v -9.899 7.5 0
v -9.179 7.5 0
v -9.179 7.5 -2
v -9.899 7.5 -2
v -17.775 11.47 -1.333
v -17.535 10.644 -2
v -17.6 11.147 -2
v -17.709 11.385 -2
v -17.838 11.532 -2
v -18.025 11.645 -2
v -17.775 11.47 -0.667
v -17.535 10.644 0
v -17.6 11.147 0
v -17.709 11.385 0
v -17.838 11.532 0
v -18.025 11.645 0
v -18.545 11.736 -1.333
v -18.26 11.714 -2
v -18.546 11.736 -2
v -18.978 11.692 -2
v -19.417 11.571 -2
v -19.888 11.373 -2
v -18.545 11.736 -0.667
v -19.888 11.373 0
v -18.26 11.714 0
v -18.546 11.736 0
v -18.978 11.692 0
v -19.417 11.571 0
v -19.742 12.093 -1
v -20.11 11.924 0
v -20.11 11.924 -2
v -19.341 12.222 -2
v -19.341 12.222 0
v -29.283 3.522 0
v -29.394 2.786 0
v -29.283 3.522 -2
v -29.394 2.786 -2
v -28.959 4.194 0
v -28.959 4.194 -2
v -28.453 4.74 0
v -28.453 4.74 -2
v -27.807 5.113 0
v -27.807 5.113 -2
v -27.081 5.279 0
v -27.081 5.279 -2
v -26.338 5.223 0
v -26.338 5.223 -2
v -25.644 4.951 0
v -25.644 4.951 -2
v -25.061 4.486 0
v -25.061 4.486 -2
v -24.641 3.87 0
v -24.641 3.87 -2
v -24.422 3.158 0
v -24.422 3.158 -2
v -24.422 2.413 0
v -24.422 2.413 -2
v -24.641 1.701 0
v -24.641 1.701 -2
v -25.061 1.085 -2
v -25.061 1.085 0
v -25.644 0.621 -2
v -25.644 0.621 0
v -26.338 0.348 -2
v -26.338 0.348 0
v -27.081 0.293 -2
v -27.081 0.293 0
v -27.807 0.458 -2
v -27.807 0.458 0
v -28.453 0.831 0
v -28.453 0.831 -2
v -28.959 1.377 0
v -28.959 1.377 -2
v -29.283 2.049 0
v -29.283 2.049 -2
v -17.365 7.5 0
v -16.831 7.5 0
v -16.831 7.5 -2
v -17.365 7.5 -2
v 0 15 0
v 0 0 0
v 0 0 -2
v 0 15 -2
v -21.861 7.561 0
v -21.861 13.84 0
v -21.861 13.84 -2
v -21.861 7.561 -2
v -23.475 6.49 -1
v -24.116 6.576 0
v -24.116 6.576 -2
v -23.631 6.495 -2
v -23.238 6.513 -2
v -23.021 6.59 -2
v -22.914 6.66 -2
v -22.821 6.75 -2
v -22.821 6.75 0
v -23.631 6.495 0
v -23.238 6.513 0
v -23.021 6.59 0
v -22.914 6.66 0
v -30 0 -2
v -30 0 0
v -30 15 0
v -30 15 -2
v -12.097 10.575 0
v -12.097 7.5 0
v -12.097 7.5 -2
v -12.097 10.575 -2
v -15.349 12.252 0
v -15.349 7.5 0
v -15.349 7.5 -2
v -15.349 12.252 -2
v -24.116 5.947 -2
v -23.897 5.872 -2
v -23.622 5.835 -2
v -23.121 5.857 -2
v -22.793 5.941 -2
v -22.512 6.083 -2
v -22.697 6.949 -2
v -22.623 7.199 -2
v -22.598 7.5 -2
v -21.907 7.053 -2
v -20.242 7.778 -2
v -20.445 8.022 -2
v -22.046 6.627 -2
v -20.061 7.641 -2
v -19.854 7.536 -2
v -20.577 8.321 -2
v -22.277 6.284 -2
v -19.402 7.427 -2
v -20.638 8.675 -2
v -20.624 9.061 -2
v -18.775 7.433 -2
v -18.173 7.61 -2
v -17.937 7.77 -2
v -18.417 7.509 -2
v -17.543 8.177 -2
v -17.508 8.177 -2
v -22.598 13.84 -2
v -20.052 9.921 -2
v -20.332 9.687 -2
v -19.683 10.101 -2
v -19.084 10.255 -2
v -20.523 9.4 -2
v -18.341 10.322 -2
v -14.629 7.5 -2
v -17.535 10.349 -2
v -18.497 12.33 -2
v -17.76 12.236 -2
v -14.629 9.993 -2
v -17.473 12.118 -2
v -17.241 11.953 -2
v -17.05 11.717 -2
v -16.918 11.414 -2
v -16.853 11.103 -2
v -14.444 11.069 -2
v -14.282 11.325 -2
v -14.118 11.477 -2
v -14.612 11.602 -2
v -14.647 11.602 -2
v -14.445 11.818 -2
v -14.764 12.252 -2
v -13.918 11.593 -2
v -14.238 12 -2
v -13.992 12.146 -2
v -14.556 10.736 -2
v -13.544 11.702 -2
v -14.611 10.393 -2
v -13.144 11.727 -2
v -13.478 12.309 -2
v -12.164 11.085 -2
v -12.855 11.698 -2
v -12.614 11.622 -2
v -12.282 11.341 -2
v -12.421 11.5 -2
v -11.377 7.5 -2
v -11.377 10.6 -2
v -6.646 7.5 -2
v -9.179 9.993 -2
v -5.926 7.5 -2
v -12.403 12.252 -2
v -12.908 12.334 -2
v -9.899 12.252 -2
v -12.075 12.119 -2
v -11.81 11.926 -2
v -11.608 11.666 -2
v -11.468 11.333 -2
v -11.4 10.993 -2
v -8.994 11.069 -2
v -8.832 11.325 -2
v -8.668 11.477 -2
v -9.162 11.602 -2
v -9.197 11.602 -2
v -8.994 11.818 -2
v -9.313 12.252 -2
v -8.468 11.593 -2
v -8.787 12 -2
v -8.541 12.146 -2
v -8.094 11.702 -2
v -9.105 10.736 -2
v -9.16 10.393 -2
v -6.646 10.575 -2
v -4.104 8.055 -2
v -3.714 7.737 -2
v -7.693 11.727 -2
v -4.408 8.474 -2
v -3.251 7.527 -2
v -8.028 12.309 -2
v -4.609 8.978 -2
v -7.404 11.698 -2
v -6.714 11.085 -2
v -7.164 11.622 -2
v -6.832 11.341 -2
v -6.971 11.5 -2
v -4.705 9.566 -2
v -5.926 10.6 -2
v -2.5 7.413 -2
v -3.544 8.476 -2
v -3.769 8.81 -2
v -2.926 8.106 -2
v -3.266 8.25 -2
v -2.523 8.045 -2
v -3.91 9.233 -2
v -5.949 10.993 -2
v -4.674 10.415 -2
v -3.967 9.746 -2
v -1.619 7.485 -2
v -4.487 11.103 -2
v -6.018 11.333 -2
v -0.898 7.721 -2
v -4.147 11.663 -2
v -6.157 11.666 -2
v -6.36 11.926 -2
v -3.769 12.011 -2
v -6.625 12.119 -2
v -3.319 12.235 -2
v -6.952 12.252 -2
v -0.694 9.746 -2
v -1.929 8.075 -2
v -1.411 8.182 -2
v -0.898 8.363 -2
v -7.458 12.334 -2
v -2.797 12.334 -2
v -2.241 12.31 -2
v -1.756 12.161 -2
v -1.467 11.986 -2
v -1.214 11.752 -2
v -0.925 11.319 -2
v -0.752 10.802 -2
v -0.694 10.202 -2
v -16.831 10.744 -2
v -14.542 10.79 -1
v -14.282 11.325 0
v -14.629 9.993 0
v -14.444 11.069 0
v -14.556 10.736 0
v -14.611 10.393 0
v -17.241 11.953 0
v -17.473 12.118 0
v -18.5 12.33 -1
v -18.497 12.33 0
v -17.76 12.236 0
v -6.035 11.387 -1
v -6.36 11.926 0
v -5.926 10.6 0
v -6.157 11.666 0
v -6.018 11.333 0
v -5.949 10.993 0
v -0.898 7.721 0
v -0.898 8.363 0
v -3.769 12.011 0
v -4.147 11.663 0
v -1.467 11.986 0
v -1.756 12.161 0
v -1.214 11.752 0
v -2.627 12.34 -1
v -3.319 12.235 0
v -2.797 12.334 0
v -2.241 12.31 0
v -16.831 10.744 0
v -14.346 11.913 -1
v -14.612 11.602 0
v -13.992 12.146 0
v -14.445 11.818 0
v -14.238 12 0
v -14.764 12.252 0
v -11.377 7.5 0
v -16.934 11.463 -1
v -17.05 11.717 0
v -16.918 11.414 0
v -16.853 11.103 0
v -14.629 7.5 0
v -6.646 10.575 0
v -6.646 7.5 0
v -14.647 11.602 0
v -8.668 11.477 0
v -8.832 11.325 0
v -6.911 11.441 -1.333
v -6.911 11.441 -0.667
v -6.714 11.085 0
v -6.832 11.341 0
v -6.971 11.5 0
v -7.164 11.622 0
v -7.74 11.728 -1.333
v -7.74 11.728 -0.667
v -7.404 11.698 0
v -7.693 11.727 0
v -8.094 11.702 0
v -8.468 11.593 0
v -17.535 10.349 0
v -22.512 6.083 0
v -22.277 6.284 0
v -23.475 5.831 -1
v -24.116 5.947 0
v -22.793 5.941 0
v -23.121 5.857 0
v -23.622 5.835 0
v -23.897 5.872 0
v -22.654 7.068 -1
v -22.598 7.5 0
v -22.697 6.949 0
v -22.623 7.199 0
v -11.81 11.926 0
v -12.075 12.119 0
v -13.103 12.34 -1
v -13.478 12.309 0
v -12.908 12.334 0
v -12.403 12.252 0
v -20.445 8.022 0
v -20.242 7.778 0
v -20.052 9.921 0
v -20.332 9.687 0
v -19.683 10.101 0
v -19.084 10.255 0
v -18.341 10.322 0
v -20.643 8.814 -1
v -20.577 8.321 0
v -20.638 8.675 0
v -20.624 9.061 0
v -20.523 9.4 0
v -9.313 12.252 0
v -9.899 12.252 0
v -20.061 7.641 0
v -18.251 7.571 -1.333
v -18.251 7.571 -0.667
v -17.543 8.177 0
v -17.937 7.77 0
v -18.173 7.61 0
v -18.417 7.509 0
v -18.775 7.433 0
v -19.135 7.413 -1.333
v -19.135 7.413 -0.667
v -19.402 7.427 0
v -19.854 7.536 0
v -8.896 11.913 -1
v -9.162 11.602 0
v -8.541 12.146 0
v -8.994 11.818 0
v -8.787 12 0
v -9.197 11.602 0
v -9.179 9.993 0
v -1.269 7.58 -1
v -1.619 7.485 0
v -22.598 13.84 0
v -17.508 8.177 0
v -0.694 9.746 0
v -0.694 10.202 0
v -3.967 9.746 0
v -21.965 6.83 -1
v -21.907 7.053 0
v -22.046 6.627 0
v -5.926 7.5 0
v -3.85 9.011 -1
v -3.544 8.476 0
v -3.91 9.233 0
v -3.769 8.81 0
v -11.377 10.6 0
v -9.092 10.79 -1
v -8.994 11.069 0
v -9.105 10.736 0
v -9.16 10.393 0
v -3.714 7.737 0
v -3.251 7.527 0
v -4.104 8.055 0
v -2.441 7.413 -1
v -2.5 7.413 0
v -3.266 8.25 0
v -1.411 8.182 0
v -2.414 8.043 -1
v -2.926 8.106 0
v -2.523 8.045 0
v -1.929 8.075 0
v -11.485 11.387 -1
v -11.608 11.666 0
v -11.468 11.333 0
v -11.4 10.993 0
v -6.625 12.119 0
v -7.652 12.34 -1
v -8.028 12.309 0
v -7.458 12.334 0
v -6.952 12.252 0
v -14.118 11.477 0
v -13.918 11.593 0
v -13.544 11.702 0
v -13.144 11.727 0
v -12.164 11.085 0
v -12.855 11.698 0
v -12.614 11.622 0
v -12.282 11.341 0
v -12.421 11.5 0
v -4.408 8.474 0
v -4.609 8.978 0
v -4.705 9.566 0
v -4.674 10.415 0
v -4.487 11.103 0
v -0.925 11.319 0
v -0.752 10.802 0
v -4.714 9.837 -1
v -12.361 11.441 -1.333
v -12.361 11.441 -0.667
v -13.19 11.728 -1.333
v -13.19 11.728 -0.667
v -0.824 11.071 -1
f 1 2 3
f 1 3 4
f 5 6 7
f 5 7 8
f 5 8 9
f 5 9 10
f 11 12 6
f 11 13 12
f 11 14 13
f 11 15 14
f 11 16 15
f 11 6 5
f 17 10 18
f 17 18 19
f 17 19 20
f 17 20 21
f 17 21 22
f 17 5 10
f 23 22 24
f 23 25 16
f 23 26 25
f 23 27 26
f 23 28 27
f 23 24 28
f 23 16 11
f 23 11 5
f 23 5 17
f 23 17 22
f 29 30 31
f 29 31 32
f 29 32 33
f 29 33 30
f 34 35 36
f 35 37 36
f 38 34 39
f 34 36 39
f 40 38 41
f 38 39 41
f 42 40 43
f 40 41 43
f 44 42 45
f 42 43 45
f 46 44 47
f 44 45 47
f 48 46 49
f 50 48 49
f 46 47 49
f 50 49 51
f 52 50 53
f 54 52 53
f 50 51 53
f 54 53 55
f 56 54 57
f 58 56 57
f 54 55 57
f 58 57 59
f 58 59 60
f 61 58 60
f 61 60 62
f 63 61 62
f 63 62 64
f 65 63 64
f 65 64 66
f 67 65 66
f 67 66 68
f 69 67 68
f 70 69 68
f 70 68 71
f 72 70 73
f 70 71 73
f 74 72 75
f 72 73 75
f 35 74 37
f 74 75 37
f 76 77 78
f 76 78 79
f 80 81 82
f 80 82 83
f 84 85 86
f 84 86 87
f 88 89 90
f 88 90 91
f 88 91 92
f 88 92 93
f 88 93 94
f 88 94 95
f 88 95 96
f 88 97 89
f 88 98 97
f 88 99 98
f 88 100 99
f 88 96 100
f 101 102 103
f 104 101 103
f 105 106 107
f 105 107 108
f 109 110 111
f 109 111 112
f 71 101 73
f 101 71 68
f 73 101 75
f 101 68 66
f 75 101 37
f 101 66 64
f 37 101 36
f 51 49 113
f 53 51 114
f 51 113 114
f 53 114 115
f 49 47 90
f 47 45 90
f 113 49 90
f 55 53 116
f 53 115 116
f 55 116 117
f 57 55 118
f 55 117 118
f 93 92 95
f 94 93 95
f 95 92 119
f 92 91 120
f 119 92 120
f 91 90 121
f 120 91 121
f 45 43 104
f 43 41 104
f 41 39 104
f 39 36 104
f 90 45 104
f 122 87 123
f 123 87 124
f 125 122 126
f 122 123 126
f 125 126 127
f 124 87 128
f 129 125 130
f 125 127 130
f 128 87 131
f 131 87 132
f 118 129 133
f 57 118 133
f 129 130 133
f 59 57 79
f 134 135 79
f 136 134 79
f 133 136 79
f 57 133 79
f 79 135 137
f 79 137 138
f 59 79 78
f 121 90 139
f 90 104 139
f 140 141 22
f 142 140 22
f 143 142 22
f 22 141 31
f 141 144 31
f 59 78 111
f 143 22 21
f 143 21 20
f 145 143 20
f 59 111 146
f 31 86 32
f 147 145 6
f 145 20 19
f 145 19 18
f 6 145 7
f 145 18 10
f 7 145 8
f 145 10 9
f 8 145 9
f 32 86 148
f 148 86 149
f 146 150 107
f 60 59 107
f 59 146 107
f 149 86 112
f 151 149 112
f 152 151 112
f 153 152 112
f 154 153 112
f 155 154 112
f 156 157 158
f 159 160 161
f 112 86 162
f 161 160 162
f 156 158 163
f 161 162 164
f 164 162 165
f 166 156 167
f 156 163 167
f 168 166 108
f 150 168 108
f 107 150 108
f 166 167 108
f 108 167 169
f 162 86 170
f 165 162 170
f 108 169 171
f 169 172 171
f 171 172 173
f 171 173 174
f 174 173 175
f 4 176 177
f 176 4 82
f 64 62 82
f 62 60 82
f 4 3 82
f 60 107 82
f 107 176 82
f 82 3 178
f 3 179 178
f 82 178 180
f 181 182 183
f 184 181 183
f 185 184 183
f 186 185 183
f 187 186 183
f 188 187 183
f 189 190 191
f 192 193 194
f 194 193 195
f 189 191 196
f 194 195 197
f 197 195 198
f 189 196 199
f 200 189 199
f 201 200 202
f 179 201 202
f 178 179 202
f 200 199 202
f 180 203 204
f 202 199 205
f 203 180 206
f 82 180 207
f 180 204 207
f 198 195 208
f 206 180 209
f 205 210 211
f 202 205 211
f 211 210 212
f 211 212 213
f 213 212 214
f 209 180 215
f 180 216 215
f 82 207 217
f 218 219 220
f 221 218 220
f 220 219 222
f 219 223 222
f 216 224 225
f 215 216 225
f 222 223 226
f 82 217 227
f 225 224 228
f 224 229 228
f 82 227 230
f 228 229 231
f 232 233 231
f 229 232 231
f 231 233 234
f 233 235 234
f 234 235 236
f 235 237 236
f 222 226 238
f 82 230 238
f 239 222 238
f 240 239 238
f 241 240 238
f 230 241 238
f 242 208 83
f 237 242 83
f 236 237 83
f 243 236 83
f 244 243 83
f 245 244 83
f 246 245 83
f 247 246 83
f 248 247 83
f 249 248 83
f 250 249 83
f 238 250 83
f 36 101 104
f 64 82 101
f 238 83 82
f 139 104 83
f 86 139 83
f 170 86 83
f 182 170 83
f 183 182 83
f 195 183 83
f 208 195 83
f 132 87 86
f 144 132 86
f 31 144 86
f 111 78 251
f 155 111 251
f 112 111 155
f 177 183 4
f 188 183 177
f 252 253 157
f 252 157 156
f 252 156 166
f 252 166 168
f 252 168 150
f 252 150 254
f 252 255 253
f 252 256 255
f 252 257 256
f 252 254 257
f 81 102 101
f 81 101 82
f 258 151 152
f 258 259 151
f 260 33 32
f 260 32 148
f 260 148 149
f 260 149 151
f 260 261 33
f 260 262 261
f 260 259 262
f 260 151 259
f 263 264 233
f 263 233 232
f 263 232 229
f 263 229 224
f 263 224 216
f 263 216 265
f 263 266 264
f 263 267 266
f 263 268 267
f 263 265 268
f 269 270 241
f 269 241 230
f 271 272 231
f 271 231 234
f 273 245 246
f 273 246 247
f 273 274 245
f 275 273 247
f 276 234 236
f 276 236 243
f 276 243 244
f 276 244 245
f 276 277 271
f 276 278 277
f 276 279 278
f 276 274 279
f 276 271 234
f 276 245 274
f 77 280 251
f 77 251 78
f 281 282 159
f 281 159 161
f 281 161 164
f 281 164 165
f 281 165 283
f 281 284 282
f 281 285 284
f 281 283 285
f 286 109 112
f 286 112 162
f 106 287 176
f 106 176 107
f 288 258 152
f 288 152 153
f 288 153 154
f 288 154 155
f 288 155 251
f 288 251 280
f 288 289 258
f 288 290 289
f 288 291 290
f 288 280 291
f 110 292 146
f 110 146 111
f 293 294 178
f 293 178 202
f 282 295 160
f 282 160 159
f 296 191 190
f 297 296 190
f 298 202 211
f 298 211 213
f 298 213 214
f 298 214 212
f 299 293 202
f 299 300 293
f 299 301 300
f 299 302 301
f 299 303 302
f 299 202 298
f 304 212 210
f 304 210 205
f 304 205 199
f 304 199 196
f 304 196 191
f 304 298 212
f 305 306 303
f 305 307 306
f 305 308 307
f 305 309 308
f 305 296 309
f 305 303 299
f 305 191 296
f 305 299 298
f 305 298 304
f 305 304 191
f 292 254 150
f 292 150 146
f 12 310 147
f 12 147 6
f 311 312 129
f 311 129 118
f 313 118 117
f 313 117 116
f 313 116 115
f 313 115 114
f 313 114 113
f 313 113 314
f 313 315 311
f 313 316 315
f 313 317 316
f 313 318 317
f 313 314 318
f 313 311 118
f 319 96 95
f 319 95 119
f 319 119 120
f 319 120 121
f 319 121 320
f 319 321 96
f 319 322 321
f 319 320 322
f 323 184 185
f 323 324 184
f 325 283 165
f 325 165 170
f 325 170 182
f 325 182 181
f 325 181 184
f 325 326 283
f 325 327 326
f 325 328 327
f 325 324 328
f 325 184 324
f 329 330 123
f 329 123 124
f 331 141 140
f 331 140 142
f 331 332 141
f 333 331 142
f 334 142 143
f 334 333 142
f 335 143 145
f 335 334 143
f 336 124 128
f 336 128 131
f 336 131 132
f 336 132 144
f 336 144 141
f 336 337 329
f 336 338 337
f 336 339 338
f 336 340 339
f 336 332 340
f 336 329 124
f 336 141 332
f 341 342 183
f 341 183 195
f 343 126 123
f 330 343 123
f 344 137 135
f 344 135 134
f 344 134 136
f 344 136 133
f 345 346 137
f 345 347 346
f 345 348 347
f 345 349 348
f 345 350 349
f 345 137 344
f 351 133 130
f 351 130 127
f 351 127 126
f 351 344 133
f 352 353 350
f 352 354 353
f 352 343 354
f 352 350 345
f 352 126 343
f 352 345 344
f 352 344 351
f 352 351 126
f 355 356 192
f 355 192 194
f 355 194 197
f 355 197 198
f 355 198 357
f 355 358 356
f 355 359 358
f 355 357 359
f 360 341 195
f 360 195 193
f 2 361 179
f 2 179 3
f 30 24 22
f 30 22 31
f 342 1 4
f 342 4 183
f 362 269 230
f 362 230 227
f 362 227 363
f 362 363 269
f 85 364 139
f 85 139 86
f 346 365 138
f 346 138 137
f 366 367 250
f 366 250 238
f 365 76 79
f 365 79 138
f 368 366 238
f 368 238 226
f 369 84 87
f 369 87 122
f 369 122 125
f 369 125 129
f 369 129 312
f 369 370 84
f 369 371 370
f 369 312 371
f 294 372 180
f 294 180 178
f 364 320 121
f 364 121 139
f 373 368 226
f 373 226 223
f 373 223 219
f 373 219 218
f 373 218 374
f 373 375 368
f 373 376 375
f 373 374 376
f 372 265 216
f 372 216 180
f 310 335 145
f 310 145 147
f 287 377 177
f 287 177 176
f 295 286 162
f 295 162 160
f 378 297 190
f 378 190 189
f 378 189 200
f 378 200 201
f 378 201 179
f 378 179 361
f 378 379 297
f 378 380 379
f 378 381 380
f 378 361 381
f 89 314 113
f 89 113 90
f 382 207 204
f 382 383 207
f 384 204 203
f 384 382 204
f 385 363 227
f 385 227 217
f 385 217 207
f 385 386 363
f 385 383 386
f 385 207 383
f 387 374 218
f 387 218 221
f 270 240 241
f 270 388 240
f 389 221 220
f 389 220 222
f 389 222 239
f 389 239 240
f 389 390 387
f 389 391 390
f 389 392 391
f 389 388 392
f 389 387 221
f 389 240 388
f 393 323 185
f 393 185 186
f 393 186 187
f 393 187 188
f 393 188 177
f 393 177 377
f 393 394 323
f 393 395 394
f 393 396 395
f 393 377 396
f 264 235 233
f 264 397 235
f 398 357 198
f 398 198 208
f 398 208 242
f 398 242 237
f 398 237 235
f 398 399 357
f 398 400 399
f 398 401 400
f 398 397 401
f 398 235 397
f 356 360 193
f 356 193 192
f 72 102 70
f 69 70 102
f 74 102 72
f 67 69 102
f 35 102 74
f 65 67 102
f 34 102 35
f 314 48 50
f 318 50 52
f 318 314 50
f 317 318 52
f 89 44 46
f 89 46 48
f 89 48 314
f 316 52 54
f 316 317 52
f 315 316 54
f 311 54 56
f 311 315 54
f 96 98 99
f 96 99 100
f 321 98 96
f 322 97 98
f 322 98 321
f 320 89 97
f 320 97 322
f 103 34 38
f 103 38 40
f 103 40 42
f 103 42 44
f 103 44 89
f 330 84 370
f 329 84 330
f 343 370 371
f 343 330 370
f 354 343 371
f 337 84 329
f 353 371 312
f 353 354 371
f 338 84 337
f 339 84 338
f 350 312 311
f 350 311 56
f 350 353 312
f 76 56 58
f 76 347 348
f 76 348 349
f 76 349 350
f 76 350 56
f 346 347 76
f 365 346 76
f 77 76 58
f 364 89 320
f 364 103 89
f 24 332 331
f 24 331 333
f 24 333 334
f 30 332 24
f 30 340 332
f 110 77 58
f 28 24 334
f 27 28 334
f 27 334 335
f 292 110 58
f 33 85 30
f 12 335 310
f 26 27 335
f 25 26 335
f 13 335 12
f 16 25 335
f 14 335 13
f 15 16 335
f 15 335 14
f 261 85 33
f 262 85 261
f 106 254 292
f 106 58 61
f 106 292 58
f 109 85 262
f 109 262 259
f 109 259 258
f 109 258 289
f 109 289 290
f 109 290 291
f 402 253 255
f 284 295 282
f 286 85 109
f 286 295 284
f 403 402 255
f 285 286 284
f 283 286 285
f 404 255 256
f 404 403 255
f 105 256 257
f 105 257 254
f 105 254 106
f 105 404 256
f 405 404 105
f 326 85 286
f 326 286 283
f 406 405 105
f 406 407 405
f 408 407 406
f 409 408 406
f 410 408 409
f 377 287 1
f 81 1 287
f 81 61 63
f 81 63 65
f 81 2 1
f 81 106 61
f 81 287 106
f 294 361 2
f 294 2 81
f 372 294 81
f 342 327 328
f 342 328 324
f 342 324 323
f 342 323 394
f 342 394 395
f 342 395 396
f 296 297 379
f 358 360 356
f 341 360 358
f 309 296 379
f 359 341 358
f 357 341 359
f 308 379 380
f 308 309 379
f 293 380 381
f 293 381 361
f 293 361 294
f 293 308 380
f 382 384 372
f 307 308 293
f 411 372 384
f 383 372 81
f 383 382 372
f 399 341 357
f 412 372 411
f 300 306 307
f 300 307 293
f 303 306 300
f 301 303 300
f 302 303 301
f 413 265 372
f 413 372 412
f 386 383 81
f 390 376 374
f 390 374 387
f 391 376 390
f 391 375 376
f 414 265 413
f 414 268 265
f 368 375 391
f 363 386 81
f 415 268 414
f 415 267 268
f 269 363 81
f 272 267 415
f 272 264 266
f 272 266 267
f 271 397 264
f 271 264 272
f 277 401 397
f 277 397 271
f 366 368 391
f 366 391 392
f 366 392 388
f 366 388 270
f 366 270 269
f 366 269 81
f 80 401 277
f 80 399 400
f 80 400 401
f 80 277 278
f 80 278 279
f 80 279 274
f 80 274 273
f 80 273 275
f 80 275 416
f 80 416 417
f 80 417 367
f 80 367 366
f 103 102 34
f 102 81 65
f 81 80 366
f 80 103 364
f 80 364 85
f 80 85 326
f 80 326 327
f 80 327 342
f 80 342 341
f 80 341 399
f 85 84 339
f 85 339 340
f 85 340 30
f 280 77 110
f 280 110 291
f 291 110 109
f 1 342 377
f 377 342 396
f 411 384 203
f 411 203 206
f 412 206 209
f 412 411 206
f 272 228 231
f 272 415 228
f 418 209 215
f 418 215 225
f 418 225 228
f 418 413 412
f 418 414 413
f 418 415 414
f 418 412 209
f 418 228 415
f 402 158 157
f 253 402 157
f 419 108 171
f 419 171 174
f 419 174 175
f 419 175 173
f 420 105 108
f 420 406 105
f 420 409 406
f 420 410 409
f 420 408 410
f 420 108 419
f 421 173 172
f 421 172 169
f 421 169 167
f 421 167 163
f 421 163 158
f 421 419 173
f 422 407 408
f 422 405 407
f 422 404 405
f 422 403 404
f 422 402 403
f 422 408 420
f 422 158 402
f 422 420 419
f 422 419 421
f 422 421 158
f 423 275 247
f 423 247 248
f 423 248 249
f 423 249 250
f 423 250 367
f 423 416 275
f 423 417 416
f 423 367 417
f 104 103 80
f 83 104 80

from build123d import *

# Parameters (mm, degrees)
F0_W     = 30
F0_H     = 15
F1_DEPTH = 2
F3_D     = 5
F3_DEPTH = 2
F3_TIP   = 1.5021515476


with BuildPart() as f1:
    # F0 (on Top) → F1 (new body)
    with BuildSketch(Plane.XY):
        with Locations((-15, 7.5)):
            Rectangle(F0_W, F0_H)
        with BuildLine():
            add(Edge.make_bspline(
                [(-22.2773678395, 6.2837986352), (-22.6936375593, 5.8307584235), (-23.4748370669, 5.8307584235)],
                knots=[0, 0, 0, 1, 1, 1], degree=2))
            add(Edge.make_bspline(
                [(-23.4748370669, 5.8307584235), (-23.8813938266, 5.8307584235), (-24.1158924354, 5.947313945)],
                knots=[0, 0, 0, 1, 1, 1], degree=2))
            Line((-24.1158924354, 5.947313945), (-24.1158924354, 6.575881222))
            add(Edge.make_bspline(
                [(-24.1158924354, 6.575881222), (-23.8078528427, 6.4898521465), (-23.4748370669, 6.4898521465)],
                knots=[0, 0, 0, 1, 1, 1], degree=2))
            add(Edge.make_bspline(
                [(-23.4748370669, 6.4898521465), (-23.0446916897, 6.4898521465), (-22.8212936067, 6.7500207214)],
                knots=[0, 0, 0, 1, 1, 1], degree=2))
            add(Edge.make_bspline(
                [(-22.8212936067, 6.7500207214), (-22.5978955238, 7.0101892963), (-22.5978955238, 7.5)],
                knots=[0, 0, 0, 1, 1, 1], degree=2))
            Line((-22.5978955238, 7.5), (-22.5978955238, 13.839787833))
            Line((-22.5978955238, 13.839787833), (-21.8610981197, 13.839787833))
            Line((-21.8610981197, 13.839787833), (-21.8610981197, 7.5610528922))
            add(Edge.make_bspline(
                [(-21.8610981197, 7.5610528922), (-21.8610981197, 6.736838847), (-22.2773678395, 6.2837986352)],
                knots=[0, 0, 0, 1, 1, 1], degree=2))
        make_face(mode=Mode.SUBTRACT)
        with BuildLine():
            Line((-16.8311723384, 7.5), (-17.3653851455, 7.5))
            Line((-17.3653851455, 7.5), (-17.508304416, 8.1771320776))
            Line((-17.508304416, 8.1771320776), (-17.5429935593, 8.1771320776))
            add(Edge.make_bspline(
                [(-17.5429935593, 8.1771320776), (-17.8982103869, 7.7303359116), (-18.2513458659, 7.5714596352)],
                knots=[0, 0, 0, 1, 1, 1], degree=2))
            add(Edge.make_bspline(
                [(-18.2513458659, 7.5714596352), (-18.6044813449, 7.4125833588), (-19.1345314548, 7.4125833588)],
                knots=[0, 0, 0, 1, 1, 1], degree=2))
            add(Edge.make_bspline(
                [(-19.1345314548, 7.4125833588), (-19.8408024128, 7.4125833588), (-20.2418089095, 7.7775131466)],
                knots=[0, 0, 0, 1, 1, 1], degree=2))
            add(Edge.make_bspline(
                [(-20.2418089095, 7.7775131466), (-20.6428154063, 8.1424429343), (-20.6428154063, 8.8140247489)],
                knots=[0, 0, 0, 1, 1, 1], degree=2))
            add(Edge.make_bspline(
                [(-20.6428154063, 8.8140247489), (-20.6428154063, 10.2529304138), (-18.3408438557, 10.3223087004)],
                knots=[0, 0, 0, 1, 1, 1], degree=2))
            Line((-18.3408438557, 10.3223087004), (-17.5346681649, 10.3486724494))
            Line((-17.5346681649, 10.3486724494), (-17.5346681649, 10.6442239504))
            add(Edge.make_bspline(
                [(-17.5346681649, 10.6442239504), (-17.5346681649, 11.2034129407), (-17.7747170367, 11.4698255614)],
                knots=[0, 0, 0, 1, 1, 1], degree=2))
            add(Edge.make_bspline(
                [(-17.7747170367, 11.4698255614), (-18.0147659085, 11.7362381821), (-18.5448160184, 11.7362381821)],
                knots=[0, 0, 0, 1, 1, 1], degree=2))
            add(Edge.make_bspline(
                [(-18.5448160184, 11.7362381821), (-19.138694152, 11.7362381821), (-19.8879796477, 11.3726959601)],
                knots=[0, 0, 0, 1, 1, 1], degree=2))
            Line((-19.8879796477, 11.3726959601), (-20.1099901649, 11.923559556))
            add(Edge.make_bspline(
                [(-20.1099901649, 11.923559556), (-19.7589360345, 12.1136560614), (-19.3405849661, 12.2218861886)],
                knots=[0, 0, 0, 1, 1, 1], degree=2))
            add(Edge.make_bspline(
                [(-19.3405849661, 12.2218861886), (-18.9222338977, 12.3301163157), (-18.5004139149, 12.3301163157)],
                knots=[0, 0, 0, 1, 1, 1], degree=2))
            add(Edge.make_bspline(
                [(-18.5004139149, 12.3301163157), (-17.6512236865, 12.3301163157), (-17.2411980124, 11.9533922193)],
                knots=[0, 0, 0, 1, 1, 1], degree=2))
            add(Edge.make_bspline(
                [(-17.2411980124, 11.9533922193), (-16.8311723384, 11.5766681229), (-16.8311723384, 10.7441286832)],
                knots=[0, 0, 0, 1, 1, 1], degree=2))
            Line((-16.8311723384, 10.7441286832), (-16.8311723384, 7.5))
        make_face(mode=Mode.SUBTRACT)
        with BuildLine():
            Line((-11.3766514429, 7.5), (-12.0967980582, 7.5))
            Line((-12.0967980582, 7.5), (-12.0967980582, 10.5748456638))
            add(Edge.make_bspline(
                [(-12.0967980582, 10.5748456638), (-12.0967980582, 11.1548481401), (-12.3611293303, 11.4413804639)],
                knots=[0, 0, 0, 1, 1, 1], degree=2))
            add(Edge.make_bspline(
                [(-12.3611293303, 11.4413804639), (-12.6254606024, 11.7279127877), (-13.1901998556, 11.7279127877)],
                knots=[0, 0, 0, 1, 1, 1], degree=2))
            add(Edge.make_bspline(
                [(-13.1901998556, 11.7279127877), (-13.9353226541, 11.7279127877), (-14.2822140873, 11.3248249424)],
                knots=[0, 0, 0, 1, 1, 1], degree=2))
            add(Edge.make_bspline(
                [(-14.2822140873, 11.3248249424), (-14.6291055205, 10.921737097), (-14.6291055205, 9.9934556218)],
                knots=[0, 0, 0, 1, 1, 1], degree=2))
            Line((-14.6291055205, 9.9934556218), (-14.6291055205, 7.5))
            Line((-14.6291055205, 7.5), (-15.3492521358, 7.5))
            Line((-15.3492521358, 7.5), (-15.3492521358, 12.2524126347))
            Line((-15.3492521358, 12.2524126347), (-14.7636993966, 12.2524126347))
            Line((-14.7636993966, 12.2524126347), (-14.647143875, 11.601644306))
            Line((-14.647143875, 11.601644306), (-14.6124547317, 11.601644306))
            add(Edge.make_bspline(
                [(-14.6124547317, 11.601644306), (-14.3904442145, 11.9526984364), (-13.9915190663, 12.1462638562)],
                knots=[0, 0, 0, 1, 1, 1], degree=2))
            add(Edge.make_bspline(
                [(-13.9915190663, 12.1462638562), (-13.5925939181, 12.3398292759), (-13.1027832145, 12.3398292759)],
                knots=[0, 0, 0, 1, 1, 1], degree=2))
            add(Edge.make_bspline(
                [(-13.1027832145, 12.3398292759), (-12.2438800259, 12.3398292759), (-11.8102657344, 11.9256409046)],
                knots=[0, 0, 0, 1, 1, 1], degree=2))
            add(Edge.make_bspline(
                [(-11.8102657344, 11.9256409046), (-11.3766514429, 11.5114525334), (-11.3766514429, 10.599821847)],
                knots=[0, 0, 0, 1, 1, 1], degree=2))
            Line((-11.3766514429, 10.599821847), (-11.3766514429, 7.5))
        make_face(mode=Mode.SUBTRACT)
        with BuildLine():
            Line((-5.9262932446, 7.5), (-6.6464398599, 7.5))
            Line((-6.6464398599, 7.5), (-6.6464398599, 10.5748456638))
            add(Edge.make_bspline(
                [(-6.6464398599, 10.5748456638), (-6.6464398599, 11.1548481401), (-6.910771132, 11.4413804639)],
                knots=[0, 0, 0, 1, 1, 1], degree=2))
            add(Edge.make_bspline(
                [(-6.910771132, 11.4413804639), (-7.1751024041, 11.7279127877), (-7.7398416573, 11.7279127877)],
                knots=[0, 0, 0, 1, 1, 1], degree=2))
            add(Edge.make_bspline(
                [(-7.7398416573, 11.7279127877), (-8.4849644558, 11.7279127877), (-8.831855889, 11.3248249424)],
                knots=[0, 0, 0, 1, 1, 1], degree=2))
            add(Edge.make_bspline(
                [(-8.831855889, 11.3248249424), (-9.1787473222, 10.921737097), (-9.1787473222, 9.9934556218)],
                knots=[0, 0, 0, 1, 1, 1], degree=2))
            Line((-9.1787473222, 9.9934556218), (-9.1787473222, 7.5))
            Line((-9.1787473222, 7.5), (-9.8988939375, 7.5))
            Line((-9.8988939375, 7.5), (-9.8988939375, 12.2524126347))
            Line((-9.8988939375, 12.2524126347), (-9.3133411983, 12.2524126347))
            Line((-9.3133411983, 12.2524126347), (-9.1967856767, 11.601644306))
            Line((-9.1967856767, 11.601644306), (-9.1620965334, 11.601644306))
            add(Edge.make_bspline(
                [(-9.1620965334, 11.601644306), (-8.9400860162, 11.9526984364), (-8.541160868, 12.1462638562)],
                knots=[0, 0, 0, 1, 1, 1], degree=2))
            add(Edge.make_bspline(
                [(-8.541160868, 12.1462638562), (-8.1422357198, 12.3398292759), (-7.6524250162, 12.3398292759)],
                knots=[0, 0, 0, 1, 1, 1], degree=2))
            add(Edge.make_bspline(
                [(-7.6524250162, 12.3398292759), (-6.7935218276, 12.3398292759), (-6.3599075361, 11.9256409046)],
                knots=[0, 0, 0, 1, 1, 1], degree=2))
            add(Edge.make_bspline(
                [(-6.3599075361, 11.9256409046), (-5.9262932446, 11.5114525334), (-5.9262932446, 10.599821847)],
                knots=[0, 0, 0, 1, 1, 1], degree=2))
            Line((-5.9262932446, 10.599821847), (-5.9262932446, 7.5))
        make_face(mode=Mode.SUBTRACT)
        with BuildLine():
            add(Edge.make_bspline(
                [(-1.6192892101, 7.4847367769), (-1.9592428147, 7.4125833588), (-2.4407281239, 7.4125833588)],
                knots=[0, 0, 0, 1, 1, 1], degree=2))
            add(Edge.make_bspline(
                [(-2.4407281239, 7.4125833588), (-3.4938905151, 7.4125833588), (-4.1037256546, 8.0550262931)],
                knots=[0, 0, 0, 1, 1, 1], degree=2))
            add(Edge.make_bspline(
                [(-4.1037256546, 8.0550262931), (-4.7135607942, 8.6974692274), (-4.7135607942, 9.836660694)],
                knots=[0, 0, 0, 1, 1, 1], degree=2))
            add(Edge.make_bspline(
                [(-4.7135607942, 9.836660694), (-4.7135607942, 10.9869526864), (-4.1474339752, 11.6633909812)],
                knots=[0, 0, 0, 1, 1, 1], degree=2))
            add(Edge.make_bspline(
                [(-4.1474339752, 11.6633909812), (-3.5813071563, 12.3398292759), (-2.6266619321, 12.3398292759)],
                knots=[0, 0, 0, 1, 1, 1], degree=2))
            add(Edge.make_bspline(
                [(-2.6266619321, 12.3398292759), (-1.734457166, 12.3398292759), (-1.2141200162, 11.752195188)],
                knots=[0, 0, 0, 1, 1, 1], degree=2))
            add(Edge.make_bspline(
                [(-1.2141200162, 11.752195188), (-0.6937828664, 11.1645611002), (-0.6937828664, 10.2015904817)],
                knots=[0, 0, 0, 1, 1, 1], degree=2))
            Line((-0.6937828664, 10.2015904817), (-0.6937828664, 9.7464689213))
            Line((-0.6937828664, 9.7464689213), (-3.96705043, 9.7464689213))
            add(Edge.make_bspline(
                [(-3.96705043, 9.7464689213), (-3.9448493782, 8.9097667845), (-3.5438428815, 8.476152493)],
                knots=[0, 0, 0, 1, 1, 1], degree=2))
            add(Edge.make_bspline(
                [(-3.5438428815, 8.476152493), (-3.1428363847, 8.0425382015), (-2.414364375, 8.0425382015)],
                knots=[0, 0, 0, 1, 1, 1], degree=2))
            add(Edge.make_bspline(
                [(-2.414364375, 8.0425382015), (-1.6470405248, 8.0425382015), (-0.8977550291, 8.3630658858)],
                knots=[0, 0, 0, 1, 1, 1], degree=2))
            Line((-0.8977550291, 8.3630658858), (-0.8977550291, 7.7206229515))
            add(Edge.make_bspline(
                [(-0.8977550291, 7.7206229515), (-1.2793356056, 7.556890195), (-1.6192892101, 7.4847367769)],
                knots=[0, 0, 0, 1, 1, 1], degree=2))
        make_face(mode=Mode.SUBTRACT)
    extrude(amount=-F1_DEPTH)

    # F3
    with Locations(Plane.XY):
        with Locations((-26.8938727677, 2.7855671942)):
            Hole(F3_D / 2, depth=F3_DEPTH)
            with Locations((0, 0, -(F3_DEPTH + F3_TIP / 2))):  # 118° drill point
                Cone(0, F3_D / 2, F3_TIP, mode=Mode.SUBTRACT)


solid = f1.part
